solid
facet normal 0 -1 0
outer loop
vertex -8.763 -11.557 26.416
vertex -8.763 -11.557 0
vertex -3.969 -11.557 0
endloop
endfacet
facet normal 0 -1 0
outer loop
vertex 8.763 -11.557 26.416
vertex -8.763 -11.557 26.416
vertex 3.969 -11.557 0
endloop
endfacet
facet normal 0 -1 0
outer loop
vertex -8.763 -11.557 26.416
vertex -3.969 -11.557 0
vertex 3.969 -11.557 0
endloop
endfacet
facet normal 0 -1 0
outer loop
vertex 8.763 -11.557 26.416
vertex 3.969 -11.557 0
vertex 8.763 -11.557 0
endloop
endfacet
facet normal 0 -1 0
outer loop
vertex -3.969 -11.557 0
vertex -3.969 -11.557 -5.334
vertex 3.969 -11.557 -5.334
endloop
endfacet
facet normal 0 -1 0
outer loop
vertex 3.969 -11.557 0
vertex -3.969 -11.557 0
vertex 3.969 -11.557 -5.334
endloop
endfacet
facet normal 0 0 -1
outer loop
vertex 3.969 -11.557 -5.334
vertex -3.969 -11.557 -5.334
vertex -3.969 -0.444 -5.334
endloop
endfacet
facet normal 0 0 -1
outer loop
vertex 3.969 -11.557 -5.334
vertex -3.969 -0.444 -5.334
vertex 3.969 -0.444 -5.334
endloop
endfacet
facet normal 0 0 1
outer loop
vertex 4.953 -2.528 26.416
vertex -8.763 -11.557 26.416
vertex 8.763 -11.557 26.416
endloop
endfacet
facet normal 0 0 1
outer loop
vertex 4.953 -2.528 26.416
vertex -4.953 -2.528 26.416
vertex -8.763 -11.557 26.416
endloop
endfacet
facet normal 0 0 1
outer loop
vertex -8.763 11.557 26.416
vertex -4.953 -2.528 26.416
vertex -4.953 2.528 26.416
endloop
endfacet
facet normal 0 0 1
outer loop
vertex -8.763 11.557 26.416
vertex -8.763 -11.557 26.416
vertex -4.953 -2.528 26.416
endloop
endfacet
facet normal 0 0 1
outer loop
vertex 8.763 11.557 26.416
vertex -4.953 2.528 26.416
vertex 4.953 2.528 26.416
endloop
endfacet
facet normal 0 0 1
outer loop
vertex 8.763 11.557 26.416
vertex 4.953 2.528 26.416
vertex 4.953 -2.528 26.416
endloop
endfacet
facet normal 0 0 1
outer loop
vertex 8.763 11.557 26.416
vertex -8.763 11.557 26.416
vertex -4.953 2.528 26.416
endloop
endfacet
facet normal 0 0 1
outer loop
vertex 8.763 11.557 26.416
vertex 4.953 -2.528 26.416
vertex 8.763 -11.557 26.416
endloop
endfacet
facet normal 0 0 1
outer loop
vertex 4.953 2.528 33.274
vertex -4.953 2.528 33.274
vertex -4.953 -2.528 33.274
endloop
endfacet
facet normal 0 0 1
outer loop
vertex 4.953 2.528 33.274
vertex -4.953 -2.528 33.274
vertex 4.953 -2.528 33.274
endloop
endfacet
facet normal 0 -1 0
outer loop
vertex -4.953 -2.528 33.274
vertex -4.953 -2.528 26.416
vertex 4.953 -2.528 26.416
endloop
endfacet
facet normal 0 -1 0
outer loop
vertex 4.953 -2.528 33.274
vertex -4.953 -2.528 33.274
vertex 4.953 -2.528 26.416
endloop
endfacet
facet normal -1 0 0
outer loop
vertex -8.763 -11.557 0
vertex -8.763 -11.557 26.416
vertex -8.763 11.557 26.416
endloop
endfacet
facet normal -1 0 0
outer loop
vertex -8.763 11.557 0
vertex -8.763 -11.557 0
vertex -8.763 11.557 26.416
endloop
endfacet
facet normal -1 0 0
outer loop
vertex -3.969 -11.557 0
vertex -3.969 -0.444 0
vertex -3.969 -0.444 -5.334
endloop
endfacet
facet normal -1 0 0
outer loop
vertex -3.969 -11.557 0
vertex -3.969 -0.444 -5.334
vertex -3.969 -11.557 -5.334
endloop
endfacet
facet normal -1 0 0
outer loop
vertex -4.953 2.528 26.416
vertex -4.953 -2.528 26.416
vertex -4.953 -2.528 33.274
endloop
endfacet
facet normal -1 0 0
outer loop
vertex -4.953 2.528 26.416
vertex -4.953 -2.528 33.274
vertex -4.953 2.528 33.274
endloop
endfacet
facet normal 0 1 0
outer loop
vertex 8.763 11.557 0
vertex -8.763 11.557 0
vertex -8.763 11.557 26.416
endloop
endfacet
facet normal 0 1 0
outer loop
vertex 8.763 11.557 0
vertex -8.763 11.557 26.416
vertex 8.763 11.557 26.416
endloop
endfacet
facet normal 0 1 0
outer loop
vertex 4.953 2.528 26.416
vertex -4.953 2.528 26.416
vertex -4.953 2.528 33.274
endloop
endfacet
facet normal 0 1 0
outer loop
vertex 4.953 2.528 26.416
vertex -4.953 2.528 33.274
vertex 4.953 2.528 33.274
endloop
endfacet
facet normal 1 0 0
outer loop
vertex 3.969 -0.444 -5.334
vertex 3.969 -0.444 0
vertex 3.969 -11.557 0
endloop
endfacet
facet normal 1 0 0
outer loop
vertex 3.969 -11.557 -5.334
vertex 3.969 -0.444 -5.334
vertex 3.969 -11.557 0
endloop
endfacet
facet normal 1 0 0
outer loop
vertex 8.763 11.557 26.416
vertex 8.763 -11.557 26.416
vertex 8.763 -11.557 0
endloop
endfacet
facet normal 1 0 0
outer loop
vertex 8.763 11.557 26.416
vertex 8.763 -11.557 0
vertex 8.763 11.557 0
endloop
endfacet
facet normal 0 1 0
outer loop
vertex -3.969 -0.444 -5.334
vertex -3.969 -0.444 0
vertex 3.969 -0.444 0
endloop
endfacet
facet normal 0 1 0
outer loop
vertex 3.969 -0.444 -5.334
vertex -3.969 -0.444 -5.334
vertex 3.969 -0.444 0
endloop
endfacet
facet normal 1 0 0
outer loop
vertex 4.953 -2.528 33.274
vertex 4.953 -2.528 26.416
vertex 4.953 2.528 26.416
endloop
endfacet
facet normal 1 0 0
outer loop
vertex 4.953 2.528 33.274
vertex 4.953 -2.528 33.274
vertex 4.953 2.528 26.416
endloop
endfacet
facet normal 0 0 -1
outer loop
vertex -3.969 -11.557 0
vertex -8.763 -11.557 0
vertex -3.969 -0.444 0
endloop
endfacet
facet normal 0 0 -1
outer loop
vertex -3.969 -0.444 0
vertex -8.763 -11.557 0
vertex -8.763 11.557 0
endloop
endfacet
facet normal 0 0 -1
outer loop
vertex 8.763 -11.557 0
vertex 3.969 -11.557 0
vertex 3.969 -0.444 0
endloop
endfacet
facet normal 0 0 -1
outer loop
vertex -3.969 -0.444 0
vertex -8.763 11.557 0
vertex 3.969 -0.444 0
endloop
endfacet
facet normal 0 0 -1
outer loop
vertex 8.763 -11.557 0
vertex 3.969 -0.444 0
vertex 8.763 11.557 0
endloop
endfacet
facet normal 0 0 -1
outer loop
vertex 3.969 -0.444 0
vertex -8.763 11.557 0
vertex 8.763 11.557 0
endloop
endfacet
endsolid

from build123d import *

# Parameters (mm, degrees)
F0_W     = 17.526
F0_H     = 23.114
F1_DEPTH = 26.416
F2_W     = 9.906
F2_H     = 5.056186
F3_DEPTH = 6.858
F4_W     = 7.9375
F4_H     = 11.1125
F5_DEPTH = 5.334


with BuildPart() as f1:
    # F0 (on Top) → F1 (new body)
    with BuildSketch(Plane.XY):
        Rectangle(F0_W, F0_H)
    extrude(amount=F1_DEPTH)

    # F2 (on face) → F3 (join)
    with BuildSketch(Plane.XY.offset(26.416)):
        Rectangle(F2_W, F2_H)
    extrude(amount=F3_DEPTH)

    # F4 (on face) → F5 (join)
    with BuildSketch(Plane(origin=(0, 0, 0), x_dir=(1, 0, 0), z_dir=(0, 0, -1))):
        with Locations((0, 6.00075)):
            Rectangle(F4_W, F4_H)
    extrude(amount=F5_DEPTH)


solid = f1.part
